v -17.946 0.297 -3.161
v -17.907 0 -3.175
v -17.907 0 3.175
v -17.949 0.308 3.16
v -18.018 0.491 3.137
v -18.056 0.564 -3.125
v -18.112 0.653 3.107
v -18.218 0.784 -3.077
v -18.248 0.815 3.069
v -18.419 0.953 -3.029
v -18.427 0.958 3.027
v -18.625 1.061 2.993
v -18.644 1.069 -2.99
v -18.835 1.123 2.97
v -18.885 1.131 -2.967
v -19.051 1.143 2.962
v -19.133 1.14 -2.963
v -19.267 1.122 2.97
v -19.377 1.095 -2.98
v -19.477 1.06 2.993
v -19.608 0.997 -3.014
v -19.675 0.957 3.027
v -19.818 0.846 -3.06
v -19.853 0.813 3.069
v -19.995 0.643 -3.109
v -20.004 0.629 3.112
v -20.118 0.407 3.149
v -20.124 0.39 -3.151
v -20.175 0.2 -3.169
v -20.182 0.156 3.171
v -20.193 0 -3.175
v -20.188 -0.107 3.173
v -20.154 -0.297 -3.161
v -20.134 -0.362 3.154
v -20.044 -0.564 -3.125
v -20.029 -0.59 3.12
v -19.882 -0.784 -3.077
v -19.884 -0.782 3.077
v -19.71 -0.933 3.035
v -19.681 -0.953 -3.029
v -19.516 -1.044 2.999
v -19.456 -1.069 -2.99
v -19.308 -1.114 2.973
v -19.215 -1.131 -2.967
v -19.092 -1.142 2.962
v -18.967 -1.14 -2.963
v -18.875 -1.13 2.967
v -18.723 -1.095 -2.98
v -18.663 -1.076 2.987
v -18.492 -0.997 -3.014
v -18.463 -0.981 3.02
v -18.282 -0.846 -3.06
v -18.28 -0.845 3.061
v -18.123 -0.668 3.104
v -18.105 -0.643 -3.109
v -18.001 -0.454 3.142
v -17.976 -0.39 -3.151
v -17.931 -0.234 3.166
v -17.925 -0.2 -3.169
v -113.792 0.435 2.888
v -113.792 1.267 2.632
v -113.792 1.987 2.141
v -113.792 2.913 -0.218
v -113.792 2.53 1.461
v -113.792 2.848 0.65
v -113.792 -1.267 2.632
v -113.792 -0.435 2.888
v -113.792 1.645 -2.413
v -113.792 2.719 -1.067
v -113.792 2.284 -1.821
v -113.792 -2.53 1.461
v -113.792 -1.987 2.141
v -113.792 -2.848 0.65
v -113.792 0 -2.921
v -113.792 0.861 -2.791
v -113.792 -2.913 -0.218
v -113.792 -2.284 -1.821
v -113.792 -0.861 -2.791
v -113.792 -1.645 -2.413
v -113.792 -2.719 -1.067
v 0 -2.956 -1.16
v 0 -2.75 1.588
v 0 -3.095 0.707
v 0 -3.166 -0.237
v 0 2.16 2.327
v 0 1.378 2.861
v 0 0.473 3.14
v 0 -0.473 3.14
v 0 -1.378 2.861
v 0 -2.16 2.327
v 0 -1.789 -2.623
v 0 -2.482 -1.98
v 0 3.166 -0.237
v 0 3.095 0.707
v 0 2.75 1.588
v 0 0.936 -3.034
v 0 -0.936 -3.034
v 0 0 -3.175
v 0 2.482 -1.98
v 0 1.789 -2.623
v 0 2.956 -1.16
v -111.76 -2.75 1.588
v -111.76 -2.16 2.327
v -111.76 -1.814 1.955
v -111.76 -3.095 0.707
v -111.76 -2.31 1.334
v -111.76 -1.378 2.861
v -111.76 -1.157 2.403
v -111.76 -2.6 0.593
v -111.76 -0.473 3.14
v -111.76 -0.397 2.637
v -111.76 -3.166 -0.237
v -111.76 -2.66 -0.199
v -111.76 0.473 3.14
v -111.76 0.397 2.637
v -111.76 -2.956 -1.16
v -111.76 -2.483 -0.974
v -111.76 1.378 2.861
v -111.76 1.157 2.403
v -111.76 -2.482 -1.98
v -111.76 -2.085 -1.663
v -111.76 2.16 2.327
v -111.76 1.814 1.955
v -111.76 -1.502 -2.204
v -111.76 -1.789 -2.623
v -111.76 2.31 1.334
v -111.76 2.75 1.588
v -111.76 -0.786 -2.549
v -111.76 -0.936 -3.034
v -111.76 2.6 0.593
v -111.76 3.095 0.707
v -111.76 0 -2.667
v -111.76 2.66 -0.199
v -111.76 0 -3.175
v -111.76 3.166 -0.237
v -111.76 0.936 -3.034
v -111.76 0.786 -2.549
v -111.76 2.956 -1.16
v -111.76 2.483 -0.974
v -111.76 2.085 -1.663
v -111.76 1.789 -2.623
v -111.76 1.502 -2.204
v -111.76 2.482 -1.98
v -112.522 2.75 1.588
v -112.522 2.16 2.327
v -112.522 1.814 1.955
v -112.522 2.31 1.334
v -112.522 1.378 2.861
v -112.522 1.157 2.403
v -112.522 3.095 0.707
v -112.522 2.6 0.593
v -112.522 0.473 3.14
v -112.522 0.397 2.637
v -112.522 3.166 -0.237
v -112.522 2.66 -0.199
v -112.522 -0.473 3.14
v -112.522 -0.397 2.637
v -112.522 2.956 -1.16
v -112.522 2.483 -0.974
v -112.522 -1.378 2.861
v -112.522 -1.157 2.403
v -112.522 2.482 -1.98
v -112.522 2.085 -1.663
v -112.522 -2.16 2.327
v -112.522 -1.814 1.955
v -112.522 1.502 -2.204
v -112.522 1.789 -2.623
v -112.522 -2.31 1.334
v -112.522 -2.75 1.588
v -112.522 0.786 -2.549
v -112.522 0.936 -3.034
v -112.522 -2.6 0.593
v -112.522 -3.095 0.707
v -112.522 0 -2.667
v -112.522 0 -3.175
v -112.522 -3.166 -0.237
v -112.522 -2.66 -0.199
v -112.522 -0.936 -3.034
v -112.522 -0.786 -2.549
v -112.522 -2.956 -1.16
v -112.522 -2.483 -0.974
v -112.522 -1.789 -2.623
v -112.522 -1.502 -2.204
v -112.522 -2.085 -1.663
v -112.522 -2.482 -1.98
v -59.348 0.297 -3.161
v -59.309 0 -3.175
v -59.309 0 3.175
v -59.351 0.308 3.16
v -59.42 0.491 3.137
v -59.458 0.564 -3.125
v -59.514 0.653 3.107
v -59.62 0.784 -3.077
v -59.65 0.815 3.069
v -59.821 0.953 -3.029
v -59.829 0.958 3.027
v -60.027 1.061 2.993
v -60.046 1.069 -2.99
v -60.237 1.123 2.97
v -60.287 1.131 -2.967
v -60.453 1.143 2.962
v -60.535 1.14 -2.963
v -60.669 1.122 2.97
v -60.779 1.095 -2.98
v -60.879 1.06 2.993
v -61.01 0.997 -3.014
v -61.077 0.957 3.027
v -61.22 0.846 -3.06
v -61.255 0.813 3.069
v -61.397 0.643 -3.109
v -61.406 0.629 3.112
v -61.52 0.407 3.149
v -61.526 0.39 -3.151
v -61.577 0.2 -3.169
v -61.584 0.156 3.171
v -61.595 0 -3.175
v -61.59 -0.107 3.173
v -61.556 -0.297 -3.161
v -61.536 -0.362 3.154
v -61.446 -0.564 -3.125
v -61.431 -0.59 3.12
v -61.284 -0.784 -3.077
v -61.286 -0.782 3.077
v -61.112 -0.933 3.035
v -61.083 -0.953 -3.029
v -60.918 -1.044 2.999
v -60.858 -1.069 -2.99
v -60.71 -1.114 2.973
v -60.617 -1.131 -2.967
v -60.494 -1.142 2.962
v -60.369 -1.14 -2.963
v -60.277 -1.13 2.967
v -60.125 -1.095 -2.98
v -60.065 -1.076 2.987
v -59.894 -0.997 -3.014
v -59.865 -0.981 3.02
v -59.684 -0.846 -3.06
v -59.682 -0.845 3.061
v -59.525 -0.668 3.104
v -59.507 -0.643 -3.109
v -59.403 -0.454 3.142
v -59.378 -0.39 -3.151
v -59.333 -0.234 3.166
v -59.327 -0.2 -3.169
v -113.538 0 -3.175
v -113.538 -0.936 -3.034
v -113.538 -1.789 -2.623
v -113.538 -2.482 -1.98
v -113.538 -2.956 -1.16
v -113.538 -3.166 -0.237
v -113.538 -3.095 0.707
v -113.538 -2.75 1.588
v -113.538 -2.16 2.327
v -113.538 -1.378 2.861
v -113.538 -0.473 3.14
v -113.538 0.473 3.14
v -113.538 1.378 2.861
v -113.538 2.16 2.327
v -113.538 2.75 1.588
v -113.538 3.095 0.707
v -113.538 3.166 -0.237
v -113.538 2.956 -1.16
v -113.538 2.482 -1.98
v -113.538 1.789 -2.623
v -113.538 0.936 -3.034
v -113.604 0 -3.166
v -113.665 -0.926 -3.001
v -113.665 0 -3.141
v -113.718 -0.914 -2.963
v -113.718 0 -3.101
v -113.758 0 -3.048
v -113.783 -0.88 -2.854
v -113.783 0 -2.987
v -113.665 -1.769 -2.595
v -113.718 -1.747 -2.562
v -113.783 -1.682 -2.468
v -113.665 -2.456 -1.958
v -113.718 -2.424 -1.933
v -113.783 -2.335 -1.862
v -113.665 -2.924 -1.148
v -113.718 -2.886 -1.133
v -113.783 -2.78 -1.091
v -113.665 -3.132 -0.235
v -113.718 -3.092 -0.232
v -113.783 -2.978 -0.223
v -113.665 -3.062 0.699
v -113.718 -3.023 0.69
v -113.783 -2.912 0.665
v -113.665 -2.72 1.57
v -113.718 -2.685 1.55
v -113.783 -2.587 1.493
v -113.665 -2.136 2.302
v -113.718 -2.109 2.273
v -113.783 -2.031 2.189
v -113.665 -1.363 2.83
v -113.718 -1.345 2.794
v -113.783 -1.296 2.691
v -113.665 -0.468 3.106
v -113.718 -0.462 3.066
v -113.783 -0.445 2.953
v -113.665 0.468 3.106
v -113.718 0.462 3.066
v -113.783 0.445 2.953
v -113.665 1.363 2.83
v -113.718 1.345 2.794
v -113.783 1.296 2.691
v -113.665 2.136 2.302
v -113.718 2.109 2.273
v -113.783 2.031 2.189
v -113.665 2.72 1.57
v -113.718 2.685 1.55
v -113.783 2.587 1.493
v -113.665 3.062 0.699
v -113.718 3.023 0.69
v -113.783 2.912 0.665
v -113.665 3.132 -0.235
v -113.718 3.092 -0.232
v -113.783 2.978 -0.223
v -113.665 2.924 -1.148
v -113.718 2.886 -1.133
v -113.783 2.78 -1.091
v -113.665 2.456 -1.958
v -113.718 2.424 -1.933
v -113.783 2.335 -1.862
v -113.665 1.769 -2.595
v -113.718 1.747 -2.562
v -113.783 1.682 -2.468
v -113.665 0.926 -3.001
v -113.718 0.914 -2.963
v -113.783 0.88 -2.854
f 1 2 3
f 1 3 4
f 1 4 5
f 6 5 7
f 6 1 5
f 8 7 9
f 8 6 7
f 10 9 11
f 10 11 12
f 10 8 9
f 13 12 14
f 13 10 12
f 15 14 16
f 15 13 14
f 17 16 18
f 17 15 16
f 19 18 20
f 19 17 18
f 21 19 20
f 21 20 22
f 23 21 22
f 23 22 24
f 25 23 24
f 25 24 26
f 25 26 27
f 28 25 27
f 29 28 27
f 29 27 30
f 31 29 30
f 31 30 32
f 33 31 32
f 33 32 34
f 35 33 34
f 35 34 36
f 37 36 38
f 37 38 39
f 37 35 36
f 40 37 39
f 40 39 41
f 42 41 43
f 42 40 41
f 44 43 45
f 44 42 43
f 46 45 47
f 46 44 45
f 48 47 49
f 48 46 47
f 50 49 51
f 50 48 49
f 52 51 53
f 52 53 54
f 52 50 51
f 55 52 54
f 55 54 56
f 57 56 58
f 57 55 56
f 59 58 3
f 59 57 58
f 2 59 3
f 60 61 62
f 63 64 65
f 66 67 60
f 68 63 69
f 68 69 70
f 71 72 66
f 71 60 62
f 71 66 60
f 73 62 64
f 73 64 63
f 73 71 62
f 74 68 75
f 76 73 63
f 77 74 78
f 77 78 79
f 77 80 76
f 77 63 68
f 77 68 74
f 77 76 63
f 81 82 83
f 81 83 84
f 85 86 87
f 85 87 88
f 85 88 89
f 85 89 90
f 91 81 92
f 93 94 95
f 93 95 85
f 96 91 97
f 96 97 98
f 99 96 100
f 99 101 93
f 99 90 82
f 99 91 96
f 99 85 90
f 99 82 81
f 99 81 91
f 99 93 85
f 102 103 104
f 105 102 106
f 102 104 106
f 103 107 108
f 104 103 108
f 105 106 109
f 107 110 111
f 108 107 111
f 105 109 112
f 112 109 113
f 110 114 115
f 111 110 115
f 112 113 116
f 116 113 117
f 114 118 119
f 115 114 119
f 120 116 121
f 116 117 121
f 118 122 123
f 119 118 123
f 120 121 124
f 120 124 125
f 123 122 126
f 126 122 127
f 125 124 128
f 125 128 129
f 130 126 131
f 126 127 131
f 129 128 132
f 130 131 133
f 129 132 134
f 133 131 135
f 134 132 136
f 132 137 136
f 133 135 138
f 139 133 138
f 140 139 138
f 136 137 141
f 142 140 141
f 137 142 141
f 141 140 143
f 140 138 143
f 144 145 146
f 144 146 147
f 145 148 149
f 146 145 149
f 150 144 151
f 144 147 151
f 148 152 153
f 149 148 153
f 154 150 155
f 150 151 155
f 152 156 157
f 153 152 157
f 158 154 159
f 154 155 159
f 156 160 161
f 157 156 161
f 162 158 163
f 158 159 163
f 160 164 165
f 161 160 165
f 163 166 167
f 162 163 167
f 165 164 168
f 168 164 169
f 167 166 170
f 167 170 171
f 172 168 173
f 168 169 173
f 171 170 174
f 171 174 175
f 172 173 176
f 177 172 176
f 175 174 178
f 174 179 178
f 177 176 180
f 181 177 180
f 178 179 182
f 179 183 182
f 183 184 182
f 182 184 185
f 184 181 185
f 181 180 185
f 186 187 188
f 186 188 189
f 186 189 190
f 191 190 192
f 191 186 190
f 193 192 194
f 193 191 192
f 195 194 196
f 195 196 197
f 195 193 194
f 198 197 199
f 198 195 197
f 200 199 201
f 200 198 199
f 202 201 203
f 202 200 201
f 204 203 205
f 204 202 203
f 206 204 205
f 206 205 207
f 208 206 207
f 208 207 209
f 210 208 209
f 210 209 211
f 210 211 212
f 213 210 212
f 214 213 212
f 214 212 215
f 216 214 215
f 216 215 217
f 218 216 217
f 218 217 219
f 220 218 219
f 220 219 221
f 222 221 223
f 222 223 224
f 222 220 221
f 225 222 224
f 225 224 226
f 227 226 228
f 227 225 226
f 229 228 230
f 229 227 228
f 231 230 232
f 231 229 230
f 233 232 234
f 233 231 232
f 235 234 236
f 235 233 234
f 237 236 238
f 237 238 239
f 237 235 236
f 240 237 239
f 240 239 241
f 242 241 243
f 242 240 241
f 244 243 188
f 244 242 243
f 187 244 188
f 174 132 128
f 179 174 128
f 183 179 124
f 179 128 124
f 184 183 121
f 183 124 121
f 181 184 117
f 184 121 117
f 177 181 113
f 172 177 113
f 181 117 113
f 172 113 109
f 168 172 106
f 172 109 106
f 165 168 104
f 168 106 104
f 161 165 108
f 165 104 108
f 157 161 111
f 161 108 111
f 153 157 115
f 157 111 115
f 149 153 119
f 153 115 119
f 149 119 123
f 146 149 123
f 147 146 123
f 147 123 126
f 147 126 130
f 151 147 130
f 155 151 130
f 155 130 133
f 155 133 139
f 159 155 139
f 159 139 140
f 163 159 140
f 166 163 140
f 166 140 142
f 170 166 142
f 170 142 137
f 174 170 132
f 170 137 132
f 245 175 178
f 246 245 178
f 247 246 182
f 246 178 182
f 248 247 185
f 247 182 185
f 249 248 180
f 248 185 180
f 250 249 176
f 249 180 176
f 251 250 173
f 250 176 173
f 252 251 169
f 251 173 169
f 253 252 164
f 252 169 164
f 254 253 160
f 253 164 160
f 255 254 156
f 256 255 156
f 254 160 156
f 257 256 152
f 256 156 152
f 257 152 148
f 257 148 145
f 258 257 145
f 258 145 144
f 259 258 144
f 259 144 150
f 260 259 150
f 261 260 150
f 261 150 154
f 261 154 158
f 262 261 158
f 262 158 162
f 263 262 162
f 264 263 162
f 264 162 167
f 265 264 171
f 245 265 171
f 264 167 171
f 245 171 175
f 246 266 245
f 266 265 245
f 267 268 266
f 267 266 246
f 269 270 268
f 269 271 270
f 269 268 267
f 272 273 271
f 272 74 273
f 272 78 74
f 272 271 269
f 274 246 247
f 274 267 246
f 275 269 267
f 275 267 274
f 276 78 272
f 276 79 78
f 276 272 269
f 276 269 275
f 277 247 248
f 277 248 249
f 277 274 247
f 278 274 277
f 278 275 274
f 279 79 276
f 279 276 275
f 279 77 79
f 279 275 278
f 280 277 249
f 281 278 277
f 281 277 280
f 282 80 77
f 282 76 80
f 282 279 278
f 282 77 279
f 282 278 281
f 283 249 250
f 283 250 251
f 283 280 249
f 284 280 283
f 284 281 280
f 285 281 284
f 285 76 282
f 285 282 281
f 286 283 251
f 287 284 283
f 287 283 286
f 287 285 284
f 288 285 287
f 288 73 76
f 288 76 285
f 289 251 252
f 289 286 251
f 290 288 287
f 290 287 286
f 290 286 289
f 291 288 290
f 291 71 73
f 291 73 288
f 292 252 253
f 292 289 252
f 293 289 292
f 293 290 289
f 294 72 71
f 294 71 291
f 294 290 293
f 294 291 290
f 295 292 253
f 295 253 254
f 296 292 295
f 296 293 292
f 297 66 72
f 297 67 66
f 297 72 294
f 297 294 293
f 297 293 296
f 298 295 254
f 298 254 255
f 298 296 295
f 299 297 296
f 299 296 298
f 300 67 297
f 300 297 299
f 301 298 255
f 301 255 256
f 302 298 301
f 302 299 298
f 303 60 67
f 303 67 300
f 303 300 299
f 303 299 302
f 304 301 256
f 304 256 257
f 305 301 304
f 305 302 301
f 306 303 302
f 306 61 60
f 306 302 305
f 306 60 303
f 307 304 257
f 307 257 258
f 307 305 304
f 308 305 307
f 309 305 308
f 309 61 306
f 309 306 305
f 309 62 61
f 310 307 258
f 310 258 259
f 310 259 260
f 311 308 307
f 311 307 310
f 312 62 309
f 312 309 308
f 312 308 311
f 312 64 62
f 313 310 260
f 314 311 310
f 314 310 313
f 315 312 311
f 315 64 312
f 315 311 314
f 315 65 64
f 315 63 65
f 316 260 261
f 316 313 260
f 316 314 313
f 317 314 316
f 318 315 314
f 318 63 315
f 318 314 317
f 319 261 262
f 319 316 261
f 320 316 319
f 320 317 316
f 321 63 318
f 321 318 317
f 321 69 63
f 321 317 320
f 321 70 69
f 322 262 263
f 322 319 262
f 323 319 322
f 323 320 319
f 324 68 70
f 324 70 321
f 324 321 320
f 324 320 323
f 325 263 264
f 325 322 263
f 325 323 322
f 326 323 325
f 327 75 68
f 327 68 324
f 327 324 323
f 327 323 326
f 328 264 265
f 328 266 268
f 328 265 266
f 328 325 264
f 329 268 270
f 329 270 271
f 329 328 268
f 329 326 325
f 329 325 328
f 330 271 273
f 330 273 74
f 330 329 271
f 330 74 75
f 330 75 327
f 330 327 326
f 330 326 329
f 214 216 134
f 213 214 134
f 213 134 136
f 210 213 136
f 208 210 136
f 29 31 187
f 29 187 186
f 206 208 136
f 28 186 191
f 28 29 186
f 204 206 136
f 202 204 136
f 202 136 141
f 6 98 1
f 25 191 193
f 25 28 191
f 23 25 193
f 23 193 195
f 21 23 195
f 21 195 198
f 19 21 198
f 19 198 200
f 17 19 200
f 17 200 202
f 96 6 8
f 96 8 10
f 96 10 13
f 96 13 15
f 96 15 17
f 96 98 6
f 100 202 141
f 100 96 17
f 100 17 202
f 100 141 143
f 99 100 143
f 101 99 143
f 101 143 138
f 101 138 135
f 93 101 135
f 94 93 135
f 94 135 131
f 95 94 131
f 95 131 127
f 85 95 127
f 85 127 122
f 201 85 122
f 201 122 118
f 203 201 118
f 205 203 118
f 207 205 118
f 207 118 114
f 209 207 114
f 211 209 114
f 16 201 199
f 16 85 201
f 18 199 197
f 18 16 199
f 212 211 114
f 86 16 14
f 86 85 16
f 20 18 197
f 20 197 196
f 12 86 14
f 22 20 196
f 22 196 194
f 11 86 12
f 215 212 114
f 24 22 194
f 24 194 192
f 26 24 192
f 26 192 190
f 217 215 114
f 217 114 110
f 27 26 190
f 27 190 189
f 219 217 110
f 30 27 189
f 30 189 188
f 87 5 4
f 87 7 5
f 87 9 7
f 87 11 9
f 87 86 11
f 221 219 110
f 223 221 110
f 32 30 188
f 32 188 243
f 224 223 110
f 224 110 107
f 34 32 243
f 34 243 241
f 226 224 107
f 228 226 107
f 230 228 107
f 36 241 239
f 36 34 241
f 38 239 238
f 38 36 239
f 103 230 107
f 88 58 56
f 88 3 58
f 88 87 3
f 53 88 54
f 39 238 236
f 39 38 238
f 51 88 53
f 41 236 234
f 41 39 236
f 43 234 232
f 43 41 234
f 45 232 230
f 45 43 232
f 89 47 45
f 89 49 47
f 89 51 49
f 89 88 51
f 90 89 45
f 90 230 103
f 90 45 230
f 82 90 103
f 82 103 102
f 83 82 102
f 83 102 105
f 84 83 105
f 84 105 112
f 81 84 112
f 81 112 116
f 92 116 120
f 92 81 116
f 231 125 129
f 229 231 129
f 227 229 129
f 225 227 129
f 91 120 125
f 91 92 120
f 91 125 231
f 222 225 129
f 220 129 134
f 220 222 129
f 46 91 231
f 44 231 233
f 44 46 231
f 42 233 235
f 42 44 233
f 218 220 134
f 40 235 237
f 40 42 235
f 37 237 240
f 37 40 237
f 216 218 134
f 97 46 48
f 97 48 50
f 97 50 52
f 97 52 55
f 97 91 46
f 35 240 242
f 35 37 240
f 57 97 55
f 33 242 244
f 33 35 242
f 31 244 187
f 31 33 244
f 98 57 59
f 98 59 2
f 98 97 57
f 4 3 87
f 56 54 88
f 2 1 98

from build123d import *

# Parameters (mm, degrees)
SKETCH1_R               = 3.175
BOSS_EXTRUDE1_DEPTH     = 111.76
SKETCH2_R               = 2.667
BOSS_EXTRUDE2_DEPTH     = 0.762
SKETCH3_R               = 3.175
BOSS_EXTRUDE3_DEPTH     = 1.27
FILLET1_R               = 0.254
CUT_EXTRUDE1_DEPTH      = 114.880553719
CUT_EXTRUDE1_DEPTH_BACK = 114.880553719
SKETCH4_R               = 1.143


with BuildPart() as part:
    # Sketch1 → Boss-Extrude1 (new body)
    with BuildSketch(Plane(origin=(0, 0, 0), x_dir=(0, 0, -1), z_dir=(1, 0, 0))):
        Circle(SKETCH1_R)
    extrude(amount=-BOSS_EXTRUDE1_DEPTH)

    # Sketch2 → Boss-Extrude2 (add)
    with BuildSketch(Plane.ZY.offset(111.76)):
        with Locations(Location((0, 0, 0), (0, 0, 180))):
            Circle(SKETCH2_R)
    extrude(amount=BOSS_EXTRUDE2_DEPTH)

    # Sketch3 → Boss-Extrude3 (add)
    with BuildSketch(Plane.ZY.offset(112.522)):
        with Locations(Location((0, 0, 0), (0, 0, 180))):
            Circle(SKETCH3_R)
    extrude(amount=BOSS_EXTRUDE3_DEPTH)

    # Fillet1
    fillet1_edges = [part.edges().sort_by_distance(p)[0] for p in [
        (-113.792, 0, 3.175),
    ]]
    fillet(fillet1_edges, radius=FILLET1_R)

    # Sketch4 → Cut-Extrude1 (cut, two sides: drawn at the far end of the back side and taken through both)
    with BuildSketch(Plane.XY.offset(-CUT_EXTRUDE1_DEPTH_BACK)):
        with Locations((-60.452, 0)):
            Circle(SKETCH4_R)
        with Locations((-19.05, 0)):
            Circle(SKETCH4_R)
    extrude(amount=CUT_EXTRUDE1_DEPTH + CUT_EXTRUDE1_DEPTH_BACK, mode=Mode.SUBTRACT)


solid = part.part
